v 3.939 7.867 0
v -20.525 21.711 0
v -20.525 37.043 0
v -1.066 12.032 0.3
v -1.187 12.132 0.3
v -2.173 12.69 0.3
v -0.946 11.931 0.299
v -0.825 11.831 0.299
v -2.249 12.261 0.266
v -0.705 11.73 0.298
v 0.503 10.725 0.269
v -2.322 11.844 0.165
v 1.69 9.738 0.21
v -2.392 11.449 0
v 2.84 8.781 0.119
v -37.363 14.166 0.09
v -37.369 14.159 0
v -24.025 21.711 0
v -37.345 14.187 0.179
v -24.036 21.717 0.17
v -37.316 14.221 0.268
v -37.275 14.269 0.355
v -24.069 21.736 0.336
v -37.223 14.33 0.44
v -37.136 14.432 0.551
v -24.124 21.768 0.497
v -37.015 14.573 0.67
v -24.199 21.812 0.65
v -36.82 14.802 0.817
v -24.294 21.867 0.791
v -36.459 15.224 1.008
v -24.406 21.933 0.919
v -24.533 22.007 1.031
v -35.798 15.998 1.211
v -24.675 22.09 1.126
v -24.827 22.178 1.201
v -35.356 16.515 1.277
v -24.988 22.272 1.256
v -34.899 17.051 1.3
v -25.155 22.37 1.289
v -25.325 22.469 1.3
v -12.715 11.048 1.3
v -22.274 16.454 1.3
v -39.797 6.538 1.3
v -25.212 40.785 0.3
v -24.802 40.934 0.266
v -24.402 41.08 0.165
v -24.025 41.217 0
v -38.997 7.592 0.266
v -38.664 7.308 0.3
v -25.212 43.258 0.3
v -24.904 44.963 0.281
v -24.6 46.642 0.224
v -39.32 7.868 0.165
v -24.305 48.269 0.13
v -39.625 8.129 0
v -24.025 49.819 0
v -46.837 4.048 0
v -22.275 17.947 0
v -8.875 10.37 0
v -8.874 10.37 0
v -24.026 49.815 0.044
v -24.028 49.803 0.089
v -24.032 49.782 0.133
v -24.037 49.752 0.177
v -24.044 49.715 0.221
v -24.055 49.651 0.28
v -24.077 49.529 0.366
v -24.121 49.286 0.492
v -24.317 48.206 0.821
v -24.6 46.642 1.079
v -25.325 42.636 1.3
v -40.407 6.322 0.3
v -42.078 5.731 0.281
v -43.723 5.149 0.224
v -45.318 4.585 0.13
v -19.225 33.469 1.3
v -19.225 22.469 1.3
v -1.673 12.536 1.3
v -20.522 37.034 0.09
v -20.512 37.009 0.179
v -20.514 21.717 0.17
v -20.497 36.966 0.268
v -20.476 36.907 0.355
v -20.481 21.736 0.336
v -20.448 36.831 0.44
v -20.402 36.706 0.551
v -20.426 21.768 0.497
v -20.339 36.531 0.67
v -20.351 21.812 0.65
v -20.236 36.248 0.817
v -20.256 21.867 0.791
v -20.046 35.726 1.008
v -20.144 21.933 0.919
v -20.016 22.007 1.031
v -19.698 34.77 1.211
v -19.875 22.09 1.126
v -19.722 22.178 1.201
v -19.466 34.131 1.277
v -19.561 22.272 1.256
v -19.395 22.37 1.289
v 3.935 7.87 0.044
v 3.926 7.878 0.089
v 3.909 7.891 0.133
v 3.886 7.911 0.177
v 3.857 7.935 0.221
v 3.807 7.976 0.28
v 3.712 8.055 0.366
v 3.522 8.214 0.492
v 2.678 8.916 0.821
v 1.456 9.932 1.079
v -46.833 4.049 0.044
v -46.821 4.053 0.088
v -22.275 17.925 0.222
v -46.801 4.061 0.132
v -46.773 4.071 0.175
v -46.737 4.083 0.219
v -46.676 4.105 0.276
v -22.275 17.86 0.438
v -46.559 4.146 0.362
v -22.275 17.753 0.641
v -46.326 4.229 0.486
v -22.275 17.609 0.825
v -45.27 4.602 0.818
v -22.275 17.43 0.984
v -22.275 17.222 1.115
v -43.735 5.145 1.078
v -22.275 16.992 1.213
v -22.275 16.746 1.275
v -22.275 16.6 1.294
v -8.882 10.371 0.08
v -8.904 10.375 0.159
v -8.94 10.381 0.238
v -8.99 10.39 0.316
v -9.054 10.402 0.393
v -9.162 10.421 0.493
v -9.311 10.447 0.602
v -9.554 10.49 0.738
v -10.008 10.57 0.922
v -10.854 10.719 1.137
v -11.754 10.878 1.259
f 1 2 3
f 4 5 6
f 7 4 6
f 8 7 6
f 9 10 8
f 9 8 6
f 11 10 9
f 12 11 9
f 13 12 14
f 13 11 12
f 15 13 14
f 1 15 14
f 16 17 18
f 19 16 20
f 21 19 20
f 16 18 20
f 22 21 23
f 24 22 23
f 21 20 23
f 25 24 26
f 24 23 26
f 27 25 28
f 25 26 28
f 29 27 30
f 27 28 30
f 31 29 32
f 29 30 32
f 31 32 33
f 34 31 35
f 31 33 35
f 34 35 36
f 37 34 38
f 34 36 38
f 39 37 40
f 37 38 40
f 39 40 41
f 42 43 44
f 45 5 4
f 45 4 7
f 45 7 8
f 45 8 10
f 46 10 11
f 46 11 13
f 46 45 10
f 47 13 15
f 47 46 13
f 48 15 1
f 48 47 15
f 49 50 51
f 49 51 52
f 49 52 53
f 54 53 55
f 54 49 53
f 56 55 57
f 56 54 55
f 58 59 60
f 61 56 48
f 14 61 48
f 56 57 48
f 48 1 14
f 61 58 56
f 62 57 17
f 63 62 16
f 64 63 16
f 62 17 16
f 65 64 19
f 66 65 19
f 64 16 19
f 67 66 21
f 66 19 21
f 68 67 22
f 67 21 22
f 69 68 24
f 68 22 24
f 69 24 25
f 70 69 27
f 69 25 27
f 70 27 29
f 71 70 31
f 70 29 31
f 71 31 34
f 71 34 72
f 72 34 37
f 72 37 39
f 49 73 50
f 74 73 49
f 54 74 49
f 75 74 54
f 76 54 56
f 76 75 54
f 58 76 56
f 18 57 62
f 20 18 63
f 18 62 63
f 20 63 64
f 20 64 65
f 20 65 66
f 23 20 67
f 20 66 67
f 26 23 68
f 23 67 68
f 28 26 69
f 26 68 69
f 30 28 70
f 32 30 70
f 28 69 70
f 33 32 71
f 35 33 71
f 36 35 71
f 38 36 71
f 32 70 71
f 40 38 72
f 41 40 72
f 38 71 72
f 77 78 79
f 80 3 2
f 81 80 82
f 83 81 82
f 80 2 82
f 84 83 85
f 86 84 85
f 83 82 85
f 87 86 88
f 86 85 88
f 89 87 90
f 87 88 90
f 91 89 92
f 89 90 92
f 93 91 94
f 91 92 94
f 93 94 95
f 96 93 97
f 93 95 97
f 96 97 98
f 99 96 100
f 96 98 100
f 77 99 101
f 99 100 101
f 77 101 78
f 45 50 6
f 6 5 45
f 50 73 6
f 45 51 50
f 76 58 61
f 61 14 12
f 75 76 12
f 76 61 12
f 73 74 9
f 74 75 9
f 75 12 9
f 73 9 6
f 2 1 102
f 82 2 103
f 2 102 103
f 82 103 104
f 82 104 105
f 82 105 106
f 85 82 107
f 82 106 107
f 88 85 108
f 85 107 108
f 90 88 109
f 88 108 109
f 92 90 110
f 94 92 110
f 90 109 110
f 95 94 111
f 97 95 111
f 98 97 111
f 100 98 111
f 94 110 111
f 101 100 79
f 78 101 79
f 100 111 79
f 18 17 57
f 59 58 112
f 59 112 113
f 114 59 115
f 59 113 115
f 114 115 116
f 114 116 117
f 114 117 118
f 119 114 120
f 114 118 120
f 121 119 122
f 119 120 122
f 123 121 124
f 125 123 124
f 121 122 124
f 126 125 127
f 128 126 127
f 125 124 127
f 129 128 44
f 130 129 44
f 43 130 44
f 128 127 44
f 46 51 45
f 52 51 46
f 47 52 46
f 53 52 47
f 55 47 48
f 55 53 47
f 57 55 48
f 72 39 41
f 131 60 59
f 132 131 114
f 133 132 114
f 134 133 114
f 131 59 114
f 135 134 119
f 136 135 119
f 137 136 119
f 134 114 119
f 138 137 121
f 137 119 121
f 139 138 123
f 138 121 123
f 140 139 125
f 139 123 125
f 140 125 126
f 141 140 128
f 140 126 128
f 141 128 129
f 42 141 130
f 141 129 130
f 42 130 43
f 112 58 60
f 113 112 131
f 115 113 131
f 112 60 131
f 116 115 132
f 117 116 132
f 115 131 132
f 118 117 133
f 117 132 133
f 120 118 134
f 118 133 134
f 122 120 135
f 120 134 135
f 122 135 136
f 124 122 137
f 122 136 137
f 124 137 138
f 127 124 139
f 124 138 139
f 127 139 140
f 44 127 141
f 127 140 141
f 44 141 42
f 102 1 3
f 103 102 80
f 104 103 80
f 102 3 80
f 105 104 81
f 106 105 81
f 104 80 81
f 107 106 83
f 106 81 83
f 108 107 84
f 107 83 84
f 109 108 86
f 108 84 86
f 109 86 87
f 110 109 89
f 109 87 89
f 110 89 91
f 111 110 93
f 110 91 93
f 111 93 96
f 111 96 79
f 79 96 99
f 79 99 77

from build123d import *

# Parameters (mm, degrees)
F1_DEPTH     = 1.3
F2_R         = 1.29999
F2_2_R       = 1.29999
F2_3_R       = 1.29999
F4_DEPTH     = 0.3
F5_T4_DEPTH  = 14.2239553164
F5_T9_DEPTH  = 50.4507657891
F5_T14_DEPTH = 14.5398031116
F5_T19_DEPTH = 49.459435346
F5_T24_DEPTH = 13.2114658899
F5_T29_DEPTH = 50.9943998556
F5_T35_DEPTH = 14.2239553164
F5_T39_DEPTH = 50.4507657891
F5_T46_DEPTH = 14.5398031116
F5_T50_DEPTH = 49.459435346
F5_T57_DEPTH = 50.9943998556
F5_T61_DEPTH = 13.2114658899


# Not quite as in the source:
# - a fillet or chamfer that OpenCascade refuses, or shapes differently, is made with other operations: its cross-section is extruded or revolved along the edge and cut away or added
# - a fillet or chamfer is up to 0.001 mm smaller than in the source, because OpenCascade refuses the exact size


with BuildPart() as f1:
    # F0 (on Top) → F1 (new body)
    with BuildSketch(Plane.XY):
        Polygon((-24.0248936415, 49.8194298056), (-37.3686429682, 14.1594352904), (-24.0248936415, 21.7105125955), align=None)
    extrude(amount=F1_DEPTH)

    # F2 (radius 1.3 in the source; OpenCascade refuses exactly that, so slightly less here)
    f2_edges = [f1.edges().sort_by_distance(p)[0] for p in [
        (-30.696768, 31.989433, 1.3),
        (-30.696768, 17.934974, 1.3),
        (-24.024894, 35.764971, 1.3),
    ]]
    fillet(f2_edges, radius=F2_R)


with BuildPart() as f1b:
    # F0 (on Top) → F1, piece 2 (new body)
    with BuildSketch(Plane.XY):
        Polygon((-20.5248936415, 37.0426492555), (-20.5248936415, 21.7105125955), (3.9386467909, 7.8668708695), align=None)
    extrude(amount=F1_DEPTH)

    # F2#2 (radius 1.3 in the source; OpenCascade refuses exactly that, so slightly less here)
    f2_2_edges = [f1b.edges().sort_by_distance(p)[0] for p in [
        (-8.293123, 22.45476, 1.3),
        (-20.524894, 29.376581, 1.3),
        (-8.293123, 14.788692, 1.3),
    ]]
    fillet(f2_2_edges, radius=F2_2_R)


with BuildPart() as f1c:
    # F0 (on Top) → F1, piece 3 (new body)
    with BuildSketch(Plane.XY):
        Polygon((-22.2747167061, 17.947387251), (-46.8371441831, 4.0477864614), (-8.874694457, 10.3699137332), align=None)
    extrude(amount=F1_DEPTH)

    # F2#3 (radius 1.3 in the source; OpenCascade refuses exactly that, so slightly less here)
    f2_3_edges = [f1c.edges().sort_by_distance(p)[0] for p in [
        (-15.574706, 14.15865, 1.3),
        (-34.55593, 10.997587, 1.3),
        (-27.855919, 7.20885, 1.3),
    ]]
    fillet(f2_3_edges, radius=F2_3_R)


with BuildPart() as f4:
    # F3 (on face) → F4 (new body)
    with BuildSketch(Plane(origin=(0, 0, 0), x_dir=(1, 0, 0), z_dir=(0, 0, -1))):
        Polygon((-39.6251897876, -8.1290127133), (-24.0248936415, -49.8194298056), (-24.0248936415, -41.2167977375), (-20.5247644335, -37.0424725115), (3.9387424476, -7.8667970374), (-2.3921415244, -11.4494320516), (-8.8744852692, -10.3698913008), (-46.8372628093, -4.0477388538), align=None)
    extrude(amount=-F4_DEPTH)

    # F5: fillet of radius 2.5 on 6 edges, made by hand


with BuildPart() as f5_tool2:
    # F5_s3 → F5_t4 (new body)
    with BuildSketch(Plane(origin=(-36.3250135829, -20.5561324652, 0), x_dir=(0, 0, 1), z_dir=(0.8703102173, 0.4925039346, 0))):
        with BuildLine():
            ThreePointArc((0.3, -25.4028904918), (0.2238399287, -26.0152629275), (0, -26.5903247005))
            Line((0, -26.5903247005), (0.044, -26.6140733847))
            ThreePointArc((0.044, -26.6140733847), (0.15, -26.6403247005), (0.3, -26.6403247005))
            Line((0.3, -26.6403247005), (0.35, -26.5903247005))
            Line((0.35, -26.5903247005), (0.35, -25.4028904918))
            Line((0.35, -25.4028904918), (0.3, -25.4028904918))
        make_face()
    extrude(amount=F5_T4_DEPTH)

    split(bisect_by=Plane(origin=(-37.4265173045, 14.0047712254, 0), x_dir=(0, 0, 1), z_dir=(-0.9365771812, 0.3504613868, 0)), keep=Keep.TOP)


with BuildPart() as f4_1:
    add(f4.part)

    # F5_t1: cut F5_tool2
    add(f5_tool2.part, mode=Mode.SUBTRACT)


with BuildPart() as f5_tool7:
    # F5_s8 → F5_t9 (new body)
    with BuildSketch(Plane(origin=(-3.2390470819, -8.6560679722, 0), x_dir=(0, 0, 1), z_dir=(0.3504613868, 0.9365771812, 0))):
        with BuildLine():
            ThreePointArc((0.3, -38.7735194163), (0.2238399287, -39.385891852), (0, -39.960953625))
            Line((0, -39.960953625), (0.044, -39.9847023092))
            ThreePointArc((0.044, -39.9847023092), (0.15, -40.010953625), (0.3, -40.010953625))
            Line((0.3, -40.010953625), (0.35, -39.960953625))
            Line((0.35, -39.960953625), (0.35, -38.7735194163))
            Line((0.35, -38.7735194163), (0.3, -38.7735194163))
        make_face()
    extrude(amount=F5_T9_DEPTH)

    split(bisect_by=Plane(origin=(-13.095839537, 23.1418312694, 0), x_dir=(0, 0, 1), z_dir=(-0.4925039346, 0.8703102173, 0)), keep=Keep.TOP)


with BuildPart() as f4_2:
    add(f4_1.part)

    # F5_t6: cut F5_tool7
    add(f5_tool7.part, mode=Mode.SUBTRACT)


with BuildPart() as f5_tool12:
    # F5_s13 → F5_t14 (new body)
    with BuildSketch(Plane.XZ.offset(-52.7880153273)):
        with BuildLine():
            ThreePointArc((-25.2123278502, 0.3), (-24.5999554145, 0.2238399287), (-24.0248936415, 0))
            Line((-24.0248936415, 0), (-24.0011449573, 0.044))
            ThreePointArc((-24.0011449573, 0.044), (-23.9748936415, 0.15), (-23.9748936415, 0.3))
            Line((-23.9748936415, 0.3), (-24.0248936415, 0.35))
            Line((-24.0248936415, 0.35), (-25.2123278502, 0.35))
            Line((-25.2123278502, 0.35), (-25.2123278502, 0.3))
        make_face()
    extrude(amount=F5_T14_DEPTH)

    split(bisect_by=Plane(origin=(6.1858887221, 5.1868047221, 0), x_dir=(0, 0, 1), z_dir=(0.7662744858, 0.6425133558, 0)), keep=Keep.TOP)


with BuildPart() as f4_3:
    add(f4_2.part)

    # F5_t11: cut F5_tool12
    add(f5_tool12.part, mode=Mode.SUBTRACT)


with BuildPart() as f5_tool17:
    # F5_s18 → F5_t19 (new body)
    with BuildSketch(Plane(origin=(-32.1181382092, 38.3047443597, 0), x_dir=(0, 0, 1), z_dir=(0.6425133558, -0.7662744858, 0))):
        with BuildLine():
            ThreePointArc((0.3, -6.8852457991), (0.2238399287, -7.4976182348), (0, -8.0726800078))
            Line((0, -8.0726800078), (0.044, -8.0964286919))
            ThreePointArc((0.044, -8.0964286919), (0.15, -8.1226800078), (0.3, -8.1226800078))
            Line((0.3, -8.1226800078), (0.35, -8.0726800078))
            Line((0.35, -8.0726800078), (0.35, -6.8852457991))
            Line((0.35, -6.8852457991), (0.3, -6.8852457991))
        make_face()
    extrude(amount=F5_T19_DEPTH)

    split(bisect_by=Plane.YZ.offset(-24.0248936415), keep=Keep.TOP)


with BuildPart() as f4_4:
    add(f4_3.part)

    # F5_t16: cut F5_tool17
    add(f5_tool17.part, mode=Mode.SUBTRACT)


with BuildPart() as f5_tool22:
    # F5_s23 → F5_t24 (new body)
    with BuildSketch(Plane(origin=(2.194973472, -1.2421312491, 0), x_dir=(0, 0, 1), z_dir=(-0.8703089586, 0.492506159, 0))):
        with BuildLine():
            ThreePointArc((0.3, 9.9738330597), (0.2238399287, 9.361460624), (0, 8.786398851))
            Line((0, 8.786398851), (0.044, 8.7626501668))
            ThreePointArc((0.044, 8.7626501668), (0.15, 8.736398851), (0.3, 8.736398851))
            Line((0.3, 8.736398851), (0.35, 8.786398851))
            Line((0.35, 8.786398851), (0.35, 9.9738330597))
            Line((0.35, 9.9738330597), (0.3, 9.9738330597))
        make_face()
    extrude(amount=F5_T24_DEPTH)

    split(bisect_by=Plane(origin=(-1.9198365379, 11.5280876274, 0), x_dir=(0, 0, 1), z_dir=(0.1642731564, -0.9864148874, 0)), keep=Keep.TOP)


with BuildPart() as f4_5:
    add(f4_4.part)

    # F5_t21: cut F5_tool22
    add(f5_tool22.part, mode=Mode.SUBTRACT)


with BuildPart() as f5_tool27:
    # F5_s28 → F5_t29 (new body)
    with BuildSketch(Plane(origin=(2.4559519667, 0.4090033381, 0), x_dir=(0, 0, 1), z_dir=(-0.9864148874, -0.1642731564, 0))):
        with BuildLine():
            ThreePointArc((0, 11.6868548668), (0.2238399287, 12.2619166398), (0.3, 12.8742890755))
            Line((0.3, 12.8742890755), (0.35, 12.8742890755))
            Line((0.35, 12.8742890755), (0.35, 11.6868548668))
            Line((0.35, 11.6868548668), (0.3, 11.6368548668))
            ThreePointArc((0.3, 11.6368548668), (0.15, 11.6368548668), (0.044, 11.6631061826))
            Line((0.044, 11.6631061826), (0, 11.6868548668))
        make_face()
    extrude(amount=F5_T29_DEPTH)

    split(bisect_by=Plane(origin=(4.3273555495, 7.6468816335, 0), x_dir=(0, 0, 1), z_dir=(-0.492506159, -0.8703089586, 0)), keep=Keep.TOP)


with BuildPart() as f4_6:
    add(f4_5.part)

    # F5_t26: cut F5_tool27
    add(f5_tool27.part, mode=Mode.SUBTRACT)


with BuildPart() as f5_tool33:
    # F5_s34 → F5_t35 (new body)
    with BuildSketch(Plane(origin=(-36.3250135829, -20.5561324652, 0), x_dir=(0, 0, 1), z_dir=(0.8703102173, 0.4925039346, 0))):
        with BuildLine():
            ThreePointArc((0.3, -25.4028904918), (0.2238399287, -26.0152629275), (0, -26.5903247005))
            Line((0, -26.5903247005), (0.044, -26.6140733847))
            ThreePointArc((0.044, -26.6140733847), (0.15, -26.6403247005), (0.3, -26.6403247005))
            Line((0.3, -26.6403247005), (0.35, -26.5903247005))
            Line((0.35, -26.5903247005), (0.35, -25.4028904918))
            Line((0.35, -25.4028904918), (0.3, -25.4028904918))
        make_face()
    extrude(amount=F5_T35_DEPTH)

    split(bisect_by=Plane(origin=(-37.4265173045, 14.0047712254, 0), x_dir=(0, 0, 1), z_dir=(0.9365771812, -0.3504613868, 0)), keep=Keep.TOP)


with BuildPart() as f5_tool37:
    # F5_s38 → F5_t39 (new body)
    with BuildSketch(Plane(origin=(-3.2390470819, -8.6560679722, 0), x_dir=(0, 0, 1), z_dir=(0.3504613868, 0.9365771812, 0))):
        with BuildLine():
            ThreePointArc((0.3, -38.7735194163), (0.2238399287, -39.385891852), (0, -39.960953625))
            Line((0, -39.960953625), (0.044, -39.9847023092))
            ThreePointArc((0.044, -39.9847023092), (0.15, -40.010953625), (0.3, -40.010953625))
            Line((0.3, -40.010953625), (0.35, -39.960953625))
            Line((0.35, -39.960953625), (0.35, -38.7735194163))
            Line((0.35, -38.7735194163), (0.3, -38.7735194163))
        make_face()
    extrude(amount=F5_T39_DEPTH)

    split(bisect_by=Plane(origin=(-13.095839537, 23.1418312694, 0), x_dir=(0, 0, 1), z_dir=(0.4925039346, -0.8703102173, 0)), keep=Keep.TOP)


with BuildPart() as f5_tool33_1:
    add(f5_tool33.part)

    # F5_t41: intersect F5_tool37
    add(f5_tool37.part, mode=Mode.INTERSECT)


with BuildPart() as f4_7:
    add(f4_6.part)

    # F5_t31: cut F5_tool33
    add(f5_tool33_1.part, mode=Mode.SUBTRACT)


with BuildPart() as f5_tool44:
    # F5_s45 → F5_t46 (new body)
    with BuildSketch(Plane.XZ.offset(-52.7880153273)):
        with BuildLine():
            ThreePointArc((-25.2123278502, 0.3), (-24.5999554145, 0.2238399287), (-24.0248936415, 0))
            Line((-24.0248936415, 0), (-24.0011449573, 0.044))
            ThreePointArc((-24.0011449573, 0.044), (-23.9748936415, 0.15), (-23.9748936415, 0.3))
            Line((-23.9748936415, 0.3), (-24.0248936415, 0.35))
            Line((-24.0248936415, 0.35), (-25.2123278502, 0.35))
            Line((-25.2123278502, 0.35), (-25.2123278502, 0.3))
        make_face()
    extrude(amount=F5_T46_DEPTH)

    split(bisect_by=Plane(origin=(6.1858887221, 5.1868047221, 0), x_dir=(0, 0, 1), z_dir=(-0.7662744858, -0.6425133558, 0)), keep=Keep.TOP)


with BuildPart() as f5_tool48:
    # F5_s49 → F5_t50 (new body)
    with BuildSketch(Plane(origin=(-32.1181382092, 38.3047443597, 0), x_dir=(0, 0, 1), z_dir=(0.6425133558, -0.7662744858, 0))):
        with BuildLine():
            ThreePointArc((0.3, -6.8852457991), (0.2238399287, -7.4976182348), (0, -8.0726800078))
            Line((0, -8.0726800078), (0.044, -8.0964286919))
            ThreePointArc((0.044, -8.0964286919), (0.15, -8.1226800078), (0.3, -8.1226800078))
            Line((0.3, -8.1226800078), (0.35, -8.0726800078))
            Line((0.35, -8.0726800078), (0.35, -6.8852457991))
            Line((0.35, -6.8852457991), (0.3, -6.8852457991))
        make_face()
    extrude(amount=F5_T50_DEPTH)

    split(bisect_by=Plane.YZ.offset(-24.0248936415), keep=Keep.BOTTOM)


with BuildPart() as f5_tool44_1:
    add(f5_tool44.part)

    # F5_t52: intersect F5_tool48
    add(f5_tool48.part, mode=Mode.INTERSECT)


with BuildPart() as f4_8:
    add(f4_7.part)

    # F5_t42: cut F5_tool44
    add(f5_tool44_1.part, mode=Mode.SUBTRACT)


with BuildPart() as f5_tool55:
    # F5_s56 → F5_t57 (new body)
    with BuildSketch(Plane(origin=(2.4559519667, 0.4090033381, 0), x_dir=(0, 0, 1), z_dir=(-0.9864148874, -0.1642731564, 0))):
        with BuildLine():
            ThreePointArc((0, 11.6868548668), (0.2238399287, 12.2619166398), (0.3, 12.8742890755))
            Line((0.3, 12.8742890755), (0.35, 12.8742890755))
            Line((0.35, 12.8742890755), (0.35, 11.6868548668))
            Line((0.35, 11.6868548668), (0.3, 11.6368548668))
            ThreePointArc((0.3, 11.6368548668), (0.15, 11.6368548668), (0.044, 11.6631061826))
            Line((0.044, 11.6631061826), (0, 11.6868548668))
        make_face()
    extrude(amount=F5_T57_DEPTH)

    split(bisect_by=Plane(origin=(4.3273555495, 7.6468816335, 0), x_dir=(0, 0, 1), z_dir=(0.492506159, 0.8703089586, 0)), keep=Keep.TOP)


with BuildPart() as f5_tool59:
    # F5_s60 → F5_t61 (new body)
    with BuildSketch(Plane(origin=(2.194973472, -1.2421312491, 0), x_dir=(0, 0, 1), z_dir=(-0.8703089586, 0.492506159, 0))):
        with BuildLine():
            ThreePointArc((0.3, 9.9738330597), (0.2238399287, 9.361460624), (0, 8.786398851))
            Line((0, 8.786398851), (0.044, 8.7626501668))
            ThreePointArc((0.044, 8.7626501668), (0.15, 8.736398851), (0.3, 8.736398851))
            Line((0.3, 8.736398851), (0.35, 8.786398851))
            Line((0.35, 8.786398851), (0.35, 9.9738330597))
            Line((0.35, 9.9738330597), (0.3, 9.9738330597))
        make_face()
    extrude(amount=F5_T61_DEPTH)

    split(bisect_by=Plane(origin=(-1.9198365379, 11.5280876274, 0), x_dir=(0, 0, 1), z_dir=(-0.1642731564, 0.9864148874, 0)), keep=Keep.TOP)


with BuildPart() as f5_tool55_1:
    add(f5_tool55.part)

    # F5_t63: intersect F5_tool59
    add(f5_tool59.part, mode=Mode.INTERSECT)


with BuildPart() as f4_9:
    add(f4_8.part)

    # F5_t53: cut F5_tool55
    add(f5_tool55_1.part, mode=Mode.SUBTRACT)


solid = Compound([f1.part, f1b.part, f1c.part, f4_9.part])
